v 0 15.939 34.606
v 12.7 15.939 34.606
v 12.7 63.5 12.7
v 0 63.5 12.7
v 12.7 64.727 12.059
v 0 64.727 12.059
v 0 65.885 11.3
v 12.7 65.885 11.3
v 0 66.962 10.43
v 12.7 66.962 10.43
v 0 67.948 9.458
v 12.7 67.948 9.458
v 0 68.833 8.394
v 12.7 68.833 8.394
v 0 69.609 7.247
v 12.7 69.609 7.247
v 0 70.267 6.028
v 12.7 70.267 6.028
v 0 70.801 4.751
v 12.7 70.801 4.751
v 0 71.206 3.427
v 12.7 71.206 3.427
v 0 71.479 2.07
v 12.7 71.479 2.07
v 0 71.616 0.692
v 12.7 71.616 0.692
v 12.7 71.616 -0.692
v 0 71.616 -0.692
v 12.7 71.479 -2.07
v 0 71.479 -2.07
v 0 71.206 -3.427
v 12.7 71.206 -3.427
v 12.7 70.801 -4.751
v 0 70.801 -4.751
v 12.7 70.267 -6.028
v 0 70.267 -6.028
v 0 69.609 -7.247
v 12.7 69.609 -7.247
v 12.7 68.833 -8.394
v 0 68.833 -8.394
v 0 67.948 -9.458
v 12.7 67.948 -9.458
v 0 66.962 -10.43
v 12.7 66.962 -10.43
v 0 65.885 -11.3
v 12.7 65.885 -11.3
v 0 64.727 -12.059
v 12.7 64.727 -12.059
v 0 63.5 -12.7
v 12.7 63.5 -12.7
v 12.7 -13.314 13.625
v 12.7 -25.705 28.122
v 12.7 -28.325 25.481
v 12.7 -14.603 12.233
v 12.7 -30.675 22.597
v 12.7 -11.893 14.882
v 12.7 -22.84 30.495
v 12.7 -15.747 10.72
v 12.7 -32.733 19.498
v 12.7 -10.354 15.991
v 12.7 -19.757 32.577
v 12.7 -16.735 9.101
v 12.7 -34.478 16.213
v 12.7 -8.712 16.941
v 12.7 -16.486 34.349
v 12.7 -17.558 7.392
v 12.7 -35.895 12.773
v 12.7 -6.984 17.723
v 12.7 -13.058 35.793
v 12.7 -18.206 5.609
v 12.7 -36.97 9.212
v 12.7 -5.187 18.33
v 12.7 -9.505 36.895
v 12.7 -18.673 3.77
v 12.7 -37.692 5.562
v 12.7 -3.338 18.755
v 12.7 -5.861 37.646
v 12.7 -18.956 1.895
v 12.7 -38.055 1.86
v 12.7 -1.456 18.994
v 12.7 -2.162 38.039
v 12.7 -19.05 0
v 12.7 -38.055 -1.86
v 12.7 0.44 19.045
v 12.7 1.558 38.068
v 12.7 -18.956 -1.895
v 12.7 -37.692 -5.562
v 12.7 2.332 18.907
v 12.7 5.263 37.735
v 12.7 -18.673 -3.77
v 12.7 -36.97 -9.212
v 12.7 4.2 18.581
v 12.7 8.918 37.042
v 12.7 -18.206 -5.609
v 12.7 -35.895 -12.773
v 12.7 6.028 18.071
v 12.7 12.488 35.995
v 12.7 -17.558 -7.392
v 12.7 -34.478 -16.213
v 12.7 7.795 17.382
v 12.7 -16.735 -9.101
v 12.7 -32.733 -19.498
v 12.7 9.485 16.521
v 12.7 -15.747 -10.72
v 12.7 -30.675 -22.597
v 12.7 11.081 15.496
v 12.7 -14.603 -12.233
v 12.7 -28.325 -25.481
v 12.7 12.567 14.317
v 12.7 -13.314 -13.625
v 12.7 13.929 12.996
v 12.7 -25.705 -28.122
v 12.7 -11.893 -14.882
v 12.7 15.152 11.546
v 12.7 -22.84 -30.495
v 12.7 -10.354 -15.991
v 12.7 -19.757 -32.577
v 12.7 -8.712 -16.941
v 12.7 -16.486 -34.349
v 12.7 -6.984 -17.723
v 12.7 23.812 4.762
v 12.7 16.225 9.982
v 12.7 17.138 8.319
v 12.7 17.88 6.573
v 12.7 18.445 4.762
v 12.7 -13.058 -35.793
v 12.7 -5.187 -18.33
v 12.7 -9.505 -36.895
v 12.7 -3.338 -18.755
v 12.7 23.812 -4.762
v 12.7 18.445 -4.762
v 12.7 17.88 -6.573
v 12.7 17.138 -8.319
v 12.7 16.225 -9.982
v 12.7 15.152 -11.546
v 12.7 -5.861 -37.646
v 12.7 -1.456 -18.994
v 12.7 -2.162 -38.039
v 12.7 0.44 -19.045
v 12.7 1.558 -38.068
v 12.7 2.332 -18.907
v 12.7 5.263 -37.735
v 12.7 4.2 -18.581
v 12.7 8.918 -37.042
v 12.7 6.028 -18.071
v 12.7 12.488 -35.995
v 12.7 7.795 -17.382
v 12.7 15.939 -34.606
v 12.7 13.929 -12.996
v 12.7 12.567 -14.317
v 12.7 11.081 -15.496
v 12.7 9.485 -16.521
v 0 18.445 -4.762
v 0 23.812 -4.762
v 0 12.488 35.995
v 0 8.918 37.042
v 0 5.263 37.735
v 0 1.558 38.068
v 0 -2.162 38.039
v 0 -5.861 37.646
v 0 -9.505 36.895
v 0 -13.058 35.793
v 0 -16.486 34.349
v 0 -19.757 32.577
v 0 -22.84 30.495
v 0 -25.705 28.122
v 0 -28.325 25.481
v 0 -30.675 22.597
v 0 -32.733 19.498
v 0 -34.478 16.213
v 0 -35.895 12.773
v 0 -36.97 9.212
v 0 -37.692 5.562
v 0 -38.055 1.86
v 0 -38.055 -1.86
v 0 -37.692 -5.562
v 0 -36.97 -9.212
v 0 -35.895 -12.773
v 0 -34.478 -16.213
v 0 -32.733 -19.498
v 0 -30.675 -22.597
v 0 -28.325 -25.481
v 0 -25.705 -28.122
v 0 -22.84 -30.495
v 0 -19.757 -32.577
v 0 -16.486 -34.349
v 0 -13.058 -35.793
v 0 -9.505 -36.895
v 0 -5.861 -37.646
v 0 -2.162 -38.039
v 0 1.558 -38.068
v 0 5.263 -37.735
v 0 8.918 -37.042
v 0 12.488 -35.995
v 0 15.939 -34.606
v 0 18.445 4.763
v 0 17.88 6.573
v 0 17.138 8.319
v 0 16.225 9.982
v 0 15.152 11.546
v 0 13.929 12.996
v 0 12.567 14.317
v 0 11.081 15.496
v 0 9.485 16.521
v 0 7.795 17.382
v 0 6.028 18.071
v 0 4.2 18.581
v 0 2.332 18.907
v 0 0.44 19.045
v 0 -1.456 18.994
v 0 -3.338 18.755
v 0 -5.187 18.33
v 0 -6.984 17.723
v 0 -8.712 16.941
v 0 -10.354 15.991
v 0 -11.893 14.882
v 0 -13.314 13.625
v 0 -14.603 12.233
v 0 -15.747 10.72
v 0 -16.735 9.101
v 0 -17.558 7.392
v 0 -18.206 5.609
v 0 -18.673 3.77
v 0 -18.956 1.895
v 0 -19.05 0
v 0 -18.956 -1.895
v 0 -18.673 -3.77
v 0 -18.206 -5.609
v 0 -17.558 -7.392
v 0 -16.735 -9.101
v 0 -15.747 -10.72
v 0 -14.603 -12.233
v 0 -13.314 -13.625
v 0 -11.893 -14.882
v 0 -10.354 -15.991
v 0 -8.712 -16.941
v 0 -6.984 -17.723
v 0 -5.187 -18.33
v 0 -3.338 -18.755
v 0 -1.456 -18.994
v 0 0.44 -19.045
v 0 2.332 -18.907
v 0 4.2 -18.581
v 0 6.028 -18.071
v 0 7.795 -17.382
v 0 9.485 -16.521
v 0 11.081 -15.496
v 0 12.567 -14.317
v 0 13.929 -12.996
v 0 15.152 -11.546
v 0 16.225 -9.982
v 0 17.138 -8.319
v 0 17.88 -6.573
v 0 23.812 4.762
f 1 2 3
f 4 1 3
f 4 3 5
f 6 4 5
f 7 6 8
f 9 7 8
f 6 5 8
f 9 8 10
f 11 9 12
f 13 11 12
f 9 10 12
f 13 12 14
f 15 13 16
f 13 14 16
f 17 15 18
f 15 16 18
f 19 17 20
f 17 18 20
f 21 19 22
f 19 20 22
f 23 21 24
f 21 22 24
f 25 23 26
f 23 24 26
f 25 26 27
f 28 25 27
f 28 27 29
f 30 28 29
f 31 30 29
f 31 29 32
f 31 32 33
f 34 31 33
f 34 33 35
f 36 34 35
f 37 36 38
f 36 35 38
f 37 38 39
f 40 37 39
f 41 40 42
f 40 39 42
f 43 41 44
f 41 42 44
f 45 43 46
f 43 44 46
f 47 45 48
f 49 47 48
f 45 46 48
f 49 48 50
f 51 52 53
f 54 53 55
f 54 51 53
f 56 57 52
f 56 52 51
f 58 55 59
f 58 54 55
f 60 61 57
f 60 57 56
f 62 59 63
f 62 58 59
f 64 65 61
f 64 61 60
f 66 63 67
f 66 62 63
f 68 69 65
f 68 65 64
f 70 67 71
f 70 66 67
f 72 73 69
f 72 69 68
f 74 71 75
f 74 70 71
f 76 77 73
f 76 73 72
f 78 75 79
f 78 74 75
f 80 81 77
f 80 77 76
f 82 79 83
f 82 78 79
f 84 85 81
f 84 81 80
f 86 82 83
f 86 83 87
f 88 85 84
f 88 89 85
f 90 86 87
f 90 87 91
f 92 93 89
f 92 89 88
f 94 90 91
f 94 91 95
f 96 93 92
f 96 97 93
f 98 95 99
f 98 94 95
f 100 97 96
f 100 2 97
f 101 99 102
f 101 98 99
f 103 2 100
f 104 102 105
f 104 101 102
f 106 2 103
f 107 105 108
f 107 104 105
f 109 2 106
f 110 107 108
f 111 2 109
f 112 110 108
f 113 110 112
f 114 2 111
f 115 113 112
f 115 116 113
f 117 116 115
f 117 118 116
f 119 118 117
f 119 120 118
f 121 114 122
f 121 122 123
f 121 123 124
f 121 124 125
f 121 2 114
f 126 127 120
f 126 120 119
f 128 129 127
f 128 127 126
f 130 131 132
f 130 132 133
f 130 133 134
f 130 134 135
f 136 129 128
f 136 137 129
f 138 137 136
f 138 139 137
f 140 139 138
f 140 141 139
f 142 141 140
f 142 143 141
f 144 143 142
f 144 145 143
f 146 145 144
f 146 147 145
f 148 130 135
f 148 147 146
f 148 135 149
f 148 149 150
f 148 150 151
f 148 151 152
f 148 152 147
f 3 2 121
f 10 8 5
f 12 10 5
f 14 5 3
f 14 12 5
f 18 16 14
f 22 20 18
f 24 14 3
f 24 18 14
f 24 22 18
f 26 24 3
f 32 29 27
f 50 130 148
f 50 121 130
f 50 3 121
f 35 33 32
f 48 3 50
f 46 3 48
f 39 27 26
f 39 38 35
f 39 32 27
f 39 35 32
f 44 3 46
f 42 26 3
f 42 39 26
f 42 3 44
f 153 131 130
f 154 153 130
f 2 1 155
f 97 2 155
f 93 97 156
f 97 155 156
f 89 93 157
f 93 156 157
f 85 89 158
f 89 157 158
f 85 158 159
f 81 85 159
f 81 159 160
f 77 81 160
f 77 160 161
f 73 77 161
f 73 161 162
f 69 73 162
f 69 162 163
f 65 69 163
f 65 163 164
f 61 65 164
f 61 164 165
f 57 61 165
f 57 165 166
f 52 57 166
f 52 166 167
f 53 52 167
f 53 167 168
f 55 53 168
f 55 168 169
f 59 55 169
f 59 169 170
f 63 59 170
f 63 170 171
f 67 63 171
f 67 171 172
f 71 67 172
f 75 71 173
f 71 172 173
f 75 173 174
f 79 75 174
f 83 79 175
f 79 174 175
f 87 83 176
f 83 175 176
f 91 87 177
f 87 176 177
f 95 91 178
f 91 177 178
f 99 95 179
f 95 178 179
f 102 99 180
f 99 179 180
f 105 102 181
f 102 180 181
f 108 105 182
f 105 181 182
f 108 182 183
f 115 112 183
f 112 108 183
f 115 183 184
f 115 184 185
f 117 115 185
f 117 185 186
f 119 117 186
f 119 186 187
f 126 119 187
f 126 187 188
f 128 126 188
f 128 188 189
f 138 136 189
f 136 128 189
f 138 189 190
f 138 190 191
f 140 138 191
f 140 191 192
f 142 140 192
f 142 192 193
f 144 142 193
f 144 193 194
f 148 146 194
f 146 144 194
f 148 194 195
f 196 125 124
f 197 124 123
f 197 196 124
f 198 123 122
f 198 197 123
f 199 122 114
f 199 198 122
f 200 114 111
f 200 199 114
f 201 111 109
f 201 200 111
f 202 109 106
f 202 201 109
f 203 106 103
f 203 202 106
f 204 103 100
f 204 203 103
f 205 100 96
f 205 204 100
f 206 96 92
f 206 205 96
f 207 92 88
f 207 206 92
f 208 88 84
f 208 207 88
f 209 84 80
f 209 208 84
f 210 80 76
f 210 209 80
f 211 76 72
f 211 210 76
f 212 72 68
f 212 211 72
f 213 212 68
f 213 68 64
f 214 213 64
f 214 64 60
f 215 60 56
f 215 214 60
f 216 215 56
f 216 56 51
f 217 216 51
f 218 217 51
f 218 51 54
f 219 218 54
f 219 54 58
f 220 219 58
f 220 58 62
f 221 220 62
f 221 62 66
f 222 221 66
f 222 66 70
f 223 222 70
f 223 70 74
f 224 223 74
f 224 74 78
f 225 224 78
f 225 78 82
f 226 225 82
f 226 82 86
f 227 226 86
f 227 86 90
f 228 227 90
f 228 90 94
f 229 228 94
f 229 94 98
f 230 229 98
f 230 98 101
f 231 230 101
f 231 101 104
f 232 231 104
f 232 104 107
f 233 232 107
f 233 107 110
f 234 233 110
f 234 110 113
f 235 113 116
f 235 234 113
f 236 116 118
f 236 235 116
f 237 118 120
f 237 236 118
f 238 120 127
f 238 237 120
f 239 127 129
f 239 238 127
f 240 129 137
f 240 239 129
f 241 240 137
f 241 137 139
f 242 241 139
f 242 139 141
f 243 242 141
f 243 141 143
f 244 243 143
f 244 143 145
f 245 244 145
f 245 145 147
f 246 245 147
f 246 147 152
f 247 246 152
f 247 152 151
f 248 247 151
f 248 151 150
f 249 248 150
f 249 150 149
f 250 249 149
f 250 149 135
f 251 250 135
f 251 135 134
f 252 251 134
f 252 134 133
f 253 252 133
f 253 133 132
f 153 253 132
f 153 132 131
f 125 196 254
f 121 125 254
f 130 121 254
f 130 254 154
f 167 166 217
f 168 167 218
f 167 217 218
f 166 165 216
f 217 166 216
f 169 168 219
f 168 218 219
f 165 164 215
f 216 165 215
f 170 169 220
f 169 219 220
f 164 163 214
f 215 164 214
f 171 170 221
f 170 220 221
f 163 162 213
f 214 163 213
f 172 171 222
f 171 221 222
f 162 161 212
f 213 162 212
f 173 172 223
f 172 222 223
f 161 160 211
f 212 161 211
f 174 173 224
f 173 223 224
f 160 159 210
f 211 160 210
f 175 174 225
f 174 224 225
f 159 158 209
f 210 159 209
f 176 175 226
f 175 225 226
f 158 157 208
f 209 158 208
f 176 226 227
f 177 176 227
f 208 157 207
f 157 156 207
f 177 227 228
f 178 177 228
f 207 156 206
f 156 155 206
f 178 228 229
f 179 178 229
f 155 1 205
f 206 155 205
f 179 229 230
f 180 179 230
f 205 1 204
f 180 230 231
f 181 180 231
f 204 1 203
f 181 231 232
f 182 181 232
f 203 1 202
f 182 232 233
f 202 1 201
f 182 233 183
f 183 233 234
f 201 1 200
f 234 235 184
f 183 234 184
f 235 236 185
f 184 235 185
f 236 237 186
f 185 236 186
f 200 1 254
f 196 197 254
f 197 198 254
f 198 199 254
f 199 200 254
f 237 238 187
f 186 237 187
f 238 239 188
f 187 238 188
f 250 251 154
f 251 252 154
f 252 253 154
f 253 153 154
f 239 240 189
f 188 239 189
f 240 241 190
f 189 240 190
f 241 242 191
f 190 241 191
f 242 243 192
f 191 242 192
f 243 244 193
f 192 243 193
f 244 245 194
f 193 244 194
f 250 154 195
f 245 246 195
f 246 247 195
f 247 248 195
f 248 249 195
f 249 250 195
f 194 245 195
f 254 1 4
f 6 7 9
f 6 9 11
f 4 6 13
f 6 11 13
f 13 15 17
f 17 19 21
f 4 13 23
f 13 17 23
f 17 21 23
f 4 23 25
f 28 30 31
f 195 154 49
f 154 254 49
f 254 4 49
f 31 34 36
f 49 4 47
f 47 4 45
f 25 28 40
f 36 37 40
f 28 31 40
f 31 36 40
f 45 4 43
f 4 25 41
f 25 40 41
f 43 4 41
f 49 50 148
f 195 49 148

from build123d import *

# Parameters (mm, degrees)
SKETCH1_R           = 38.1
SKETCH1_R_2         = 19.05
BOSS_EXTRUDE1_DEPTH = 12.7
SKETCH2_W           = 9.525
SKETCH2_H           = 9.525
CUT_EXTRUDE1_DEPTH  = 13.7
BOSS_EXTRUDE2_DEPTH = 12.7


with BuildPart() as part:
    # Sketch1 → Boss-Extrude1 (new body)
    with BuildSketch(Plane(origin=(0, 0, 0), x_dir=(0, 0, -1), z_dir=(1, 0, 0))):
        Circle(SKETCH1_R)
        Circle(SKETCH1_R_2, mode=Mode.SUBTRACT)
    extrude(amount=BOSS_EXTRUDE1_DEPTH)

    # Sketch2 → Cut-Extrude1 (cut, through all)
    with BuildSketch(Plane(origin=(12.7, 0, 0), x_dir=(0, 0, -1), z_dir=(1, 0, 0))):
        with Locations((0, 19.05)):
            Rectangle(SKETCH2_W, SKETCH2_H)
    extrude(amount=-CUT_EXTRUDE1_DEPTH, mode=Mode.SUBTRACT)

    # Sketch3 → Boss-Extrude2 (add)
    with BuildSketch(Plane(origin=(12.7, 0, 0), x_dir=(0, 0, -1), z_dir=(1, 0, 0))):
        with BuildLine():
            Line((-34.605831603, 15.938833679), (-12.7, 63.5))
            ThreePointArc((-12.7, 63.5), (0, 71.632930181), (12.7, 63.5))
            Line((12.7, 63.5), (34.605831603, 15.938833679))
            ThreePointArc((34.605831603, 15.938833679), (0, 38.1), (-34.605831603, 15.938833679))
        make_face()
    extrude(amount=-BOSS_EXTRUDE2_DEPTH)


solid = part.part
